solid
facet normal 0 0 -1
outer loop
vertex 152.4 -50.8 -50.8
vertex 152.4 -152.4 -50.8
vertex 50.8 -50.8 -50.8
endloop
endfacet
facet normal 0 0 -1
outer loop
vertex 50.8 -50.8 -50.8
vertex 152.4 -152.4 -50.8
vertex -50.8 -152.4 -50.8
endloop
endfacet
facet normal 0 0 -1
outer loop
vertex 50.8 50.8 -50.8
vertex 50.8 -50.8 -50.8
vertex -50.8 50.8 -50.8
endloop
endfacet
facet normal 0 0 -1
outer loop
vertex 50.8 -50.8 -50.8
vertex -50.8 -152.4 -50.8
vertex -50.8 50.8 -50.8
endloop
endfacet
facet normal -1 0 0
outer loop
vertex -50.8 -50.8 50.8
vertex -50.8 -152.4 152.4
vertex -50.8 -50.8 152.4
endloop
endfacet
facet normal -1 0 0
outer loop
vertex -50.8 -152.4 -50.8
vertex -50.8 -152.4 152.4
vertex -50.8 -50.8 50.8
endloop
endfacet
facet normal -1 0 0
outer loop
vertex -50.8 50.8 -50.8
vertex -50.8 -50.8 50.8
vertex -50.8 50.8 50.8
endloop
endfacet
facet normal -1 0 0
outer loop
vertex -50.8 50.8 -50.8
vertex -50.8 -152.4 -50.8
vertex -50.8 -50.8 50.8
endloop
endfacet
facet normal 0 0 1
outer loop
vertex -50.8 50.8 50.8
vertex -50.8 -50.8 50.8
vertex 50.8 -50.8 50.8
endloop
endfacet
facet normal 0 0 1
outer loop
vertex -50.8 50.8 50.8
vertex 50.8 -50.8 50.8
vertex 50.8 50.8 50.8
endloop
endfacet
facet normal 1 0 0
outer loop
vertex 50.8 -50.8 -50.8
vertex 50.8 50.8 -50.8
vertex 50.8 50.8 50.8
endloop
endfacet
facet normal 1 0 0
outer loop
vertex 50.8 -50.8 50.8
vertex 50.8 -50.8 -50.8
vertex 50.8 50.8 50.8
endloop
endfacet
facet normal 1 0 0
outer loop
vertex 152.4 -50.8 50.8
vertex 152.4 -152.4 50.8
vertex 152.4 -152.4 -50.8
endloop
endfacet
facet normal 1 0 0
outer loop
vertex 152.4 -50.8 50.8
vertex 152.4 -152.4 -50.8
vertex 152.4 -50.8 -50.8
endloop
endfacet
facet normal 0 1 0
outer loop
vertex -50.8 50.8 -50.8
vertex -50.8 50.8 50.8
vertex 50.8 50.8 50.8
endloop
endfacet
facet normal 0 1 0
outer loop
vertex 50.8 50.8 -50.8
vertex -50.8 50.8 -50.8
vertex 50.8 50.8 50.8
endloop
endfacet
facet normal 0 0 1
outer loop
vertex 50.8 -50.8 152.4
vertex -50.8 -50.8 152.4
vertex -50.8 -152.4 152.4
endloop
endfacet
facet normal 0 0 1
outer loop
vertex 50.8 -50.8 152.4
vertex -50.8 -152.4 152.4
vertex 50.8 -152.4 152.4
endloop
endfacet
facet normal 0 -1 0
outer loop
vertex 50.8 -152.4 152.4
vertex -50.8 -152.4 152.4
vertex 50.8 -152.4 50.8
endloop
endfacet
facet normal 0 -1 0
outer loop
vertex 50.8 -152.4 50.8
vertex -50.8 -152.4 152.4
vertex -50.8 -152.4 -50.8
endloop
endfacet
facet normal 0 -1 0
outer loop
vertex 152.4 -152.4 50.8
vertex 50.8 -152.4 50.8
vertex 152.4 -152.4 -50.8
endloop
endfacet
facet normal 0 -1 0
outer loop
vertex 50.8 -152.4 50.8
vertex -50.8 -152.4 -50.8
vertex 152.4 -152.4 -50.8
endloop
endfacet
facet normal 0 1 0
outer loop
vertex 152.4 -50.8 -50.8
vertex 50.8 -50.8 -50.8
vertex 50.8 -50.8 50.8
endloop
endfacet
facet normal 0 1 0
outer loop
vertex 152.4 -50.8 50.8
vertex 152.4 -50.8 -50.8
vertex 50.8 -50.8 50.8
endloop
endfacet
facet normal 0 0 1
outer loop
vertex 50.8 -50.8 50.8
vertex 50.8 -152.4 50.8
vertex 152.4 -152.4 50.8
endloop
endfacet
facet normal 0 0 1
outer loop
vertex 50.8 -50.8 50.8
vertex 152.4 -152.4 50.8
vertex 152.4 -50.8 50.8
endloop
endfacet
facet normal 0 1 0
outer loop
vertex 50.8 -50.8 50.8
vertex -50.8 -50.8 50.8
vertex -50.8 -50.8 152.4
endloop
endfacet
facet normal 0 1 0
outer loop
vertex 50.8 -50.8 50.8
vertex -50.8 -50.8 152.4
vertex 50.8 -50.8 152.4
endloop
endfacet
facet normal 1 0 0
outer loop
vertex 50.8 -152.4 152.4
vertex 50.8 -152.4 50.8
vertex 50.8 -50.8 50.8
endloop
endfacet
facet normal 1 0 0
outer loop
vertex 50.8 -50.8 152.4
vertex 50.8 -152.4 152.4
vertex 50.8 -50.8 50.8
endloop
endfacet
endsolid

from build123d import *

# Parameters (mm, degrees)
F1_W     = 101.6
F1_H     = 101.6
F2_DEPTH = 50.8
F3_W     = 101.6
F3_H     = 101.6
F4_DEPTH = 101.6
F5_W     = 101.6
F5_H     = 101.6
F6_DEPTH = 101.6
F7_W     = 101.6
F7_H     = 101.6
F8_DEPTH = 101.6


# Not quite as in the source:
# - a variable given as a bare number and used for a length is read in inches; the dataset says mm whatever the document's units were


with BuildPart() as f2:
    # F1 (on Front) → F2 (new body, symmetric)
    with BuildSketch(Plane.XZ):
        Rectangle(F1_W, F1_H)
    extrude(amount=F2_DEPTH, both=True)

    # F3 (on face) → F4 (join)
    with BuildSketch(Plane.XZ.offset(50.8)):
        Rectangle(F3_W, F3_H)
    extrude(amount=F4_DEPTH)

    # F5 (on face) → F6 (join)
    with BuildSketch(Plane.YZ.offset(50.8)):
        with Locations((-101.6, 0)):
            Rectangle(F5_W, F5_H)
    extrude(amount=F6_DEPTH)

    # F7 (on face) → F8 (join)
    with BuildSketch(Plane.XY.offset(50.8)):
        with Locations((0, -101.6)):
            Rectangle(F7_W, F7_H)
    extrude(amount=F8_DEPTH)


solid = f2.part
